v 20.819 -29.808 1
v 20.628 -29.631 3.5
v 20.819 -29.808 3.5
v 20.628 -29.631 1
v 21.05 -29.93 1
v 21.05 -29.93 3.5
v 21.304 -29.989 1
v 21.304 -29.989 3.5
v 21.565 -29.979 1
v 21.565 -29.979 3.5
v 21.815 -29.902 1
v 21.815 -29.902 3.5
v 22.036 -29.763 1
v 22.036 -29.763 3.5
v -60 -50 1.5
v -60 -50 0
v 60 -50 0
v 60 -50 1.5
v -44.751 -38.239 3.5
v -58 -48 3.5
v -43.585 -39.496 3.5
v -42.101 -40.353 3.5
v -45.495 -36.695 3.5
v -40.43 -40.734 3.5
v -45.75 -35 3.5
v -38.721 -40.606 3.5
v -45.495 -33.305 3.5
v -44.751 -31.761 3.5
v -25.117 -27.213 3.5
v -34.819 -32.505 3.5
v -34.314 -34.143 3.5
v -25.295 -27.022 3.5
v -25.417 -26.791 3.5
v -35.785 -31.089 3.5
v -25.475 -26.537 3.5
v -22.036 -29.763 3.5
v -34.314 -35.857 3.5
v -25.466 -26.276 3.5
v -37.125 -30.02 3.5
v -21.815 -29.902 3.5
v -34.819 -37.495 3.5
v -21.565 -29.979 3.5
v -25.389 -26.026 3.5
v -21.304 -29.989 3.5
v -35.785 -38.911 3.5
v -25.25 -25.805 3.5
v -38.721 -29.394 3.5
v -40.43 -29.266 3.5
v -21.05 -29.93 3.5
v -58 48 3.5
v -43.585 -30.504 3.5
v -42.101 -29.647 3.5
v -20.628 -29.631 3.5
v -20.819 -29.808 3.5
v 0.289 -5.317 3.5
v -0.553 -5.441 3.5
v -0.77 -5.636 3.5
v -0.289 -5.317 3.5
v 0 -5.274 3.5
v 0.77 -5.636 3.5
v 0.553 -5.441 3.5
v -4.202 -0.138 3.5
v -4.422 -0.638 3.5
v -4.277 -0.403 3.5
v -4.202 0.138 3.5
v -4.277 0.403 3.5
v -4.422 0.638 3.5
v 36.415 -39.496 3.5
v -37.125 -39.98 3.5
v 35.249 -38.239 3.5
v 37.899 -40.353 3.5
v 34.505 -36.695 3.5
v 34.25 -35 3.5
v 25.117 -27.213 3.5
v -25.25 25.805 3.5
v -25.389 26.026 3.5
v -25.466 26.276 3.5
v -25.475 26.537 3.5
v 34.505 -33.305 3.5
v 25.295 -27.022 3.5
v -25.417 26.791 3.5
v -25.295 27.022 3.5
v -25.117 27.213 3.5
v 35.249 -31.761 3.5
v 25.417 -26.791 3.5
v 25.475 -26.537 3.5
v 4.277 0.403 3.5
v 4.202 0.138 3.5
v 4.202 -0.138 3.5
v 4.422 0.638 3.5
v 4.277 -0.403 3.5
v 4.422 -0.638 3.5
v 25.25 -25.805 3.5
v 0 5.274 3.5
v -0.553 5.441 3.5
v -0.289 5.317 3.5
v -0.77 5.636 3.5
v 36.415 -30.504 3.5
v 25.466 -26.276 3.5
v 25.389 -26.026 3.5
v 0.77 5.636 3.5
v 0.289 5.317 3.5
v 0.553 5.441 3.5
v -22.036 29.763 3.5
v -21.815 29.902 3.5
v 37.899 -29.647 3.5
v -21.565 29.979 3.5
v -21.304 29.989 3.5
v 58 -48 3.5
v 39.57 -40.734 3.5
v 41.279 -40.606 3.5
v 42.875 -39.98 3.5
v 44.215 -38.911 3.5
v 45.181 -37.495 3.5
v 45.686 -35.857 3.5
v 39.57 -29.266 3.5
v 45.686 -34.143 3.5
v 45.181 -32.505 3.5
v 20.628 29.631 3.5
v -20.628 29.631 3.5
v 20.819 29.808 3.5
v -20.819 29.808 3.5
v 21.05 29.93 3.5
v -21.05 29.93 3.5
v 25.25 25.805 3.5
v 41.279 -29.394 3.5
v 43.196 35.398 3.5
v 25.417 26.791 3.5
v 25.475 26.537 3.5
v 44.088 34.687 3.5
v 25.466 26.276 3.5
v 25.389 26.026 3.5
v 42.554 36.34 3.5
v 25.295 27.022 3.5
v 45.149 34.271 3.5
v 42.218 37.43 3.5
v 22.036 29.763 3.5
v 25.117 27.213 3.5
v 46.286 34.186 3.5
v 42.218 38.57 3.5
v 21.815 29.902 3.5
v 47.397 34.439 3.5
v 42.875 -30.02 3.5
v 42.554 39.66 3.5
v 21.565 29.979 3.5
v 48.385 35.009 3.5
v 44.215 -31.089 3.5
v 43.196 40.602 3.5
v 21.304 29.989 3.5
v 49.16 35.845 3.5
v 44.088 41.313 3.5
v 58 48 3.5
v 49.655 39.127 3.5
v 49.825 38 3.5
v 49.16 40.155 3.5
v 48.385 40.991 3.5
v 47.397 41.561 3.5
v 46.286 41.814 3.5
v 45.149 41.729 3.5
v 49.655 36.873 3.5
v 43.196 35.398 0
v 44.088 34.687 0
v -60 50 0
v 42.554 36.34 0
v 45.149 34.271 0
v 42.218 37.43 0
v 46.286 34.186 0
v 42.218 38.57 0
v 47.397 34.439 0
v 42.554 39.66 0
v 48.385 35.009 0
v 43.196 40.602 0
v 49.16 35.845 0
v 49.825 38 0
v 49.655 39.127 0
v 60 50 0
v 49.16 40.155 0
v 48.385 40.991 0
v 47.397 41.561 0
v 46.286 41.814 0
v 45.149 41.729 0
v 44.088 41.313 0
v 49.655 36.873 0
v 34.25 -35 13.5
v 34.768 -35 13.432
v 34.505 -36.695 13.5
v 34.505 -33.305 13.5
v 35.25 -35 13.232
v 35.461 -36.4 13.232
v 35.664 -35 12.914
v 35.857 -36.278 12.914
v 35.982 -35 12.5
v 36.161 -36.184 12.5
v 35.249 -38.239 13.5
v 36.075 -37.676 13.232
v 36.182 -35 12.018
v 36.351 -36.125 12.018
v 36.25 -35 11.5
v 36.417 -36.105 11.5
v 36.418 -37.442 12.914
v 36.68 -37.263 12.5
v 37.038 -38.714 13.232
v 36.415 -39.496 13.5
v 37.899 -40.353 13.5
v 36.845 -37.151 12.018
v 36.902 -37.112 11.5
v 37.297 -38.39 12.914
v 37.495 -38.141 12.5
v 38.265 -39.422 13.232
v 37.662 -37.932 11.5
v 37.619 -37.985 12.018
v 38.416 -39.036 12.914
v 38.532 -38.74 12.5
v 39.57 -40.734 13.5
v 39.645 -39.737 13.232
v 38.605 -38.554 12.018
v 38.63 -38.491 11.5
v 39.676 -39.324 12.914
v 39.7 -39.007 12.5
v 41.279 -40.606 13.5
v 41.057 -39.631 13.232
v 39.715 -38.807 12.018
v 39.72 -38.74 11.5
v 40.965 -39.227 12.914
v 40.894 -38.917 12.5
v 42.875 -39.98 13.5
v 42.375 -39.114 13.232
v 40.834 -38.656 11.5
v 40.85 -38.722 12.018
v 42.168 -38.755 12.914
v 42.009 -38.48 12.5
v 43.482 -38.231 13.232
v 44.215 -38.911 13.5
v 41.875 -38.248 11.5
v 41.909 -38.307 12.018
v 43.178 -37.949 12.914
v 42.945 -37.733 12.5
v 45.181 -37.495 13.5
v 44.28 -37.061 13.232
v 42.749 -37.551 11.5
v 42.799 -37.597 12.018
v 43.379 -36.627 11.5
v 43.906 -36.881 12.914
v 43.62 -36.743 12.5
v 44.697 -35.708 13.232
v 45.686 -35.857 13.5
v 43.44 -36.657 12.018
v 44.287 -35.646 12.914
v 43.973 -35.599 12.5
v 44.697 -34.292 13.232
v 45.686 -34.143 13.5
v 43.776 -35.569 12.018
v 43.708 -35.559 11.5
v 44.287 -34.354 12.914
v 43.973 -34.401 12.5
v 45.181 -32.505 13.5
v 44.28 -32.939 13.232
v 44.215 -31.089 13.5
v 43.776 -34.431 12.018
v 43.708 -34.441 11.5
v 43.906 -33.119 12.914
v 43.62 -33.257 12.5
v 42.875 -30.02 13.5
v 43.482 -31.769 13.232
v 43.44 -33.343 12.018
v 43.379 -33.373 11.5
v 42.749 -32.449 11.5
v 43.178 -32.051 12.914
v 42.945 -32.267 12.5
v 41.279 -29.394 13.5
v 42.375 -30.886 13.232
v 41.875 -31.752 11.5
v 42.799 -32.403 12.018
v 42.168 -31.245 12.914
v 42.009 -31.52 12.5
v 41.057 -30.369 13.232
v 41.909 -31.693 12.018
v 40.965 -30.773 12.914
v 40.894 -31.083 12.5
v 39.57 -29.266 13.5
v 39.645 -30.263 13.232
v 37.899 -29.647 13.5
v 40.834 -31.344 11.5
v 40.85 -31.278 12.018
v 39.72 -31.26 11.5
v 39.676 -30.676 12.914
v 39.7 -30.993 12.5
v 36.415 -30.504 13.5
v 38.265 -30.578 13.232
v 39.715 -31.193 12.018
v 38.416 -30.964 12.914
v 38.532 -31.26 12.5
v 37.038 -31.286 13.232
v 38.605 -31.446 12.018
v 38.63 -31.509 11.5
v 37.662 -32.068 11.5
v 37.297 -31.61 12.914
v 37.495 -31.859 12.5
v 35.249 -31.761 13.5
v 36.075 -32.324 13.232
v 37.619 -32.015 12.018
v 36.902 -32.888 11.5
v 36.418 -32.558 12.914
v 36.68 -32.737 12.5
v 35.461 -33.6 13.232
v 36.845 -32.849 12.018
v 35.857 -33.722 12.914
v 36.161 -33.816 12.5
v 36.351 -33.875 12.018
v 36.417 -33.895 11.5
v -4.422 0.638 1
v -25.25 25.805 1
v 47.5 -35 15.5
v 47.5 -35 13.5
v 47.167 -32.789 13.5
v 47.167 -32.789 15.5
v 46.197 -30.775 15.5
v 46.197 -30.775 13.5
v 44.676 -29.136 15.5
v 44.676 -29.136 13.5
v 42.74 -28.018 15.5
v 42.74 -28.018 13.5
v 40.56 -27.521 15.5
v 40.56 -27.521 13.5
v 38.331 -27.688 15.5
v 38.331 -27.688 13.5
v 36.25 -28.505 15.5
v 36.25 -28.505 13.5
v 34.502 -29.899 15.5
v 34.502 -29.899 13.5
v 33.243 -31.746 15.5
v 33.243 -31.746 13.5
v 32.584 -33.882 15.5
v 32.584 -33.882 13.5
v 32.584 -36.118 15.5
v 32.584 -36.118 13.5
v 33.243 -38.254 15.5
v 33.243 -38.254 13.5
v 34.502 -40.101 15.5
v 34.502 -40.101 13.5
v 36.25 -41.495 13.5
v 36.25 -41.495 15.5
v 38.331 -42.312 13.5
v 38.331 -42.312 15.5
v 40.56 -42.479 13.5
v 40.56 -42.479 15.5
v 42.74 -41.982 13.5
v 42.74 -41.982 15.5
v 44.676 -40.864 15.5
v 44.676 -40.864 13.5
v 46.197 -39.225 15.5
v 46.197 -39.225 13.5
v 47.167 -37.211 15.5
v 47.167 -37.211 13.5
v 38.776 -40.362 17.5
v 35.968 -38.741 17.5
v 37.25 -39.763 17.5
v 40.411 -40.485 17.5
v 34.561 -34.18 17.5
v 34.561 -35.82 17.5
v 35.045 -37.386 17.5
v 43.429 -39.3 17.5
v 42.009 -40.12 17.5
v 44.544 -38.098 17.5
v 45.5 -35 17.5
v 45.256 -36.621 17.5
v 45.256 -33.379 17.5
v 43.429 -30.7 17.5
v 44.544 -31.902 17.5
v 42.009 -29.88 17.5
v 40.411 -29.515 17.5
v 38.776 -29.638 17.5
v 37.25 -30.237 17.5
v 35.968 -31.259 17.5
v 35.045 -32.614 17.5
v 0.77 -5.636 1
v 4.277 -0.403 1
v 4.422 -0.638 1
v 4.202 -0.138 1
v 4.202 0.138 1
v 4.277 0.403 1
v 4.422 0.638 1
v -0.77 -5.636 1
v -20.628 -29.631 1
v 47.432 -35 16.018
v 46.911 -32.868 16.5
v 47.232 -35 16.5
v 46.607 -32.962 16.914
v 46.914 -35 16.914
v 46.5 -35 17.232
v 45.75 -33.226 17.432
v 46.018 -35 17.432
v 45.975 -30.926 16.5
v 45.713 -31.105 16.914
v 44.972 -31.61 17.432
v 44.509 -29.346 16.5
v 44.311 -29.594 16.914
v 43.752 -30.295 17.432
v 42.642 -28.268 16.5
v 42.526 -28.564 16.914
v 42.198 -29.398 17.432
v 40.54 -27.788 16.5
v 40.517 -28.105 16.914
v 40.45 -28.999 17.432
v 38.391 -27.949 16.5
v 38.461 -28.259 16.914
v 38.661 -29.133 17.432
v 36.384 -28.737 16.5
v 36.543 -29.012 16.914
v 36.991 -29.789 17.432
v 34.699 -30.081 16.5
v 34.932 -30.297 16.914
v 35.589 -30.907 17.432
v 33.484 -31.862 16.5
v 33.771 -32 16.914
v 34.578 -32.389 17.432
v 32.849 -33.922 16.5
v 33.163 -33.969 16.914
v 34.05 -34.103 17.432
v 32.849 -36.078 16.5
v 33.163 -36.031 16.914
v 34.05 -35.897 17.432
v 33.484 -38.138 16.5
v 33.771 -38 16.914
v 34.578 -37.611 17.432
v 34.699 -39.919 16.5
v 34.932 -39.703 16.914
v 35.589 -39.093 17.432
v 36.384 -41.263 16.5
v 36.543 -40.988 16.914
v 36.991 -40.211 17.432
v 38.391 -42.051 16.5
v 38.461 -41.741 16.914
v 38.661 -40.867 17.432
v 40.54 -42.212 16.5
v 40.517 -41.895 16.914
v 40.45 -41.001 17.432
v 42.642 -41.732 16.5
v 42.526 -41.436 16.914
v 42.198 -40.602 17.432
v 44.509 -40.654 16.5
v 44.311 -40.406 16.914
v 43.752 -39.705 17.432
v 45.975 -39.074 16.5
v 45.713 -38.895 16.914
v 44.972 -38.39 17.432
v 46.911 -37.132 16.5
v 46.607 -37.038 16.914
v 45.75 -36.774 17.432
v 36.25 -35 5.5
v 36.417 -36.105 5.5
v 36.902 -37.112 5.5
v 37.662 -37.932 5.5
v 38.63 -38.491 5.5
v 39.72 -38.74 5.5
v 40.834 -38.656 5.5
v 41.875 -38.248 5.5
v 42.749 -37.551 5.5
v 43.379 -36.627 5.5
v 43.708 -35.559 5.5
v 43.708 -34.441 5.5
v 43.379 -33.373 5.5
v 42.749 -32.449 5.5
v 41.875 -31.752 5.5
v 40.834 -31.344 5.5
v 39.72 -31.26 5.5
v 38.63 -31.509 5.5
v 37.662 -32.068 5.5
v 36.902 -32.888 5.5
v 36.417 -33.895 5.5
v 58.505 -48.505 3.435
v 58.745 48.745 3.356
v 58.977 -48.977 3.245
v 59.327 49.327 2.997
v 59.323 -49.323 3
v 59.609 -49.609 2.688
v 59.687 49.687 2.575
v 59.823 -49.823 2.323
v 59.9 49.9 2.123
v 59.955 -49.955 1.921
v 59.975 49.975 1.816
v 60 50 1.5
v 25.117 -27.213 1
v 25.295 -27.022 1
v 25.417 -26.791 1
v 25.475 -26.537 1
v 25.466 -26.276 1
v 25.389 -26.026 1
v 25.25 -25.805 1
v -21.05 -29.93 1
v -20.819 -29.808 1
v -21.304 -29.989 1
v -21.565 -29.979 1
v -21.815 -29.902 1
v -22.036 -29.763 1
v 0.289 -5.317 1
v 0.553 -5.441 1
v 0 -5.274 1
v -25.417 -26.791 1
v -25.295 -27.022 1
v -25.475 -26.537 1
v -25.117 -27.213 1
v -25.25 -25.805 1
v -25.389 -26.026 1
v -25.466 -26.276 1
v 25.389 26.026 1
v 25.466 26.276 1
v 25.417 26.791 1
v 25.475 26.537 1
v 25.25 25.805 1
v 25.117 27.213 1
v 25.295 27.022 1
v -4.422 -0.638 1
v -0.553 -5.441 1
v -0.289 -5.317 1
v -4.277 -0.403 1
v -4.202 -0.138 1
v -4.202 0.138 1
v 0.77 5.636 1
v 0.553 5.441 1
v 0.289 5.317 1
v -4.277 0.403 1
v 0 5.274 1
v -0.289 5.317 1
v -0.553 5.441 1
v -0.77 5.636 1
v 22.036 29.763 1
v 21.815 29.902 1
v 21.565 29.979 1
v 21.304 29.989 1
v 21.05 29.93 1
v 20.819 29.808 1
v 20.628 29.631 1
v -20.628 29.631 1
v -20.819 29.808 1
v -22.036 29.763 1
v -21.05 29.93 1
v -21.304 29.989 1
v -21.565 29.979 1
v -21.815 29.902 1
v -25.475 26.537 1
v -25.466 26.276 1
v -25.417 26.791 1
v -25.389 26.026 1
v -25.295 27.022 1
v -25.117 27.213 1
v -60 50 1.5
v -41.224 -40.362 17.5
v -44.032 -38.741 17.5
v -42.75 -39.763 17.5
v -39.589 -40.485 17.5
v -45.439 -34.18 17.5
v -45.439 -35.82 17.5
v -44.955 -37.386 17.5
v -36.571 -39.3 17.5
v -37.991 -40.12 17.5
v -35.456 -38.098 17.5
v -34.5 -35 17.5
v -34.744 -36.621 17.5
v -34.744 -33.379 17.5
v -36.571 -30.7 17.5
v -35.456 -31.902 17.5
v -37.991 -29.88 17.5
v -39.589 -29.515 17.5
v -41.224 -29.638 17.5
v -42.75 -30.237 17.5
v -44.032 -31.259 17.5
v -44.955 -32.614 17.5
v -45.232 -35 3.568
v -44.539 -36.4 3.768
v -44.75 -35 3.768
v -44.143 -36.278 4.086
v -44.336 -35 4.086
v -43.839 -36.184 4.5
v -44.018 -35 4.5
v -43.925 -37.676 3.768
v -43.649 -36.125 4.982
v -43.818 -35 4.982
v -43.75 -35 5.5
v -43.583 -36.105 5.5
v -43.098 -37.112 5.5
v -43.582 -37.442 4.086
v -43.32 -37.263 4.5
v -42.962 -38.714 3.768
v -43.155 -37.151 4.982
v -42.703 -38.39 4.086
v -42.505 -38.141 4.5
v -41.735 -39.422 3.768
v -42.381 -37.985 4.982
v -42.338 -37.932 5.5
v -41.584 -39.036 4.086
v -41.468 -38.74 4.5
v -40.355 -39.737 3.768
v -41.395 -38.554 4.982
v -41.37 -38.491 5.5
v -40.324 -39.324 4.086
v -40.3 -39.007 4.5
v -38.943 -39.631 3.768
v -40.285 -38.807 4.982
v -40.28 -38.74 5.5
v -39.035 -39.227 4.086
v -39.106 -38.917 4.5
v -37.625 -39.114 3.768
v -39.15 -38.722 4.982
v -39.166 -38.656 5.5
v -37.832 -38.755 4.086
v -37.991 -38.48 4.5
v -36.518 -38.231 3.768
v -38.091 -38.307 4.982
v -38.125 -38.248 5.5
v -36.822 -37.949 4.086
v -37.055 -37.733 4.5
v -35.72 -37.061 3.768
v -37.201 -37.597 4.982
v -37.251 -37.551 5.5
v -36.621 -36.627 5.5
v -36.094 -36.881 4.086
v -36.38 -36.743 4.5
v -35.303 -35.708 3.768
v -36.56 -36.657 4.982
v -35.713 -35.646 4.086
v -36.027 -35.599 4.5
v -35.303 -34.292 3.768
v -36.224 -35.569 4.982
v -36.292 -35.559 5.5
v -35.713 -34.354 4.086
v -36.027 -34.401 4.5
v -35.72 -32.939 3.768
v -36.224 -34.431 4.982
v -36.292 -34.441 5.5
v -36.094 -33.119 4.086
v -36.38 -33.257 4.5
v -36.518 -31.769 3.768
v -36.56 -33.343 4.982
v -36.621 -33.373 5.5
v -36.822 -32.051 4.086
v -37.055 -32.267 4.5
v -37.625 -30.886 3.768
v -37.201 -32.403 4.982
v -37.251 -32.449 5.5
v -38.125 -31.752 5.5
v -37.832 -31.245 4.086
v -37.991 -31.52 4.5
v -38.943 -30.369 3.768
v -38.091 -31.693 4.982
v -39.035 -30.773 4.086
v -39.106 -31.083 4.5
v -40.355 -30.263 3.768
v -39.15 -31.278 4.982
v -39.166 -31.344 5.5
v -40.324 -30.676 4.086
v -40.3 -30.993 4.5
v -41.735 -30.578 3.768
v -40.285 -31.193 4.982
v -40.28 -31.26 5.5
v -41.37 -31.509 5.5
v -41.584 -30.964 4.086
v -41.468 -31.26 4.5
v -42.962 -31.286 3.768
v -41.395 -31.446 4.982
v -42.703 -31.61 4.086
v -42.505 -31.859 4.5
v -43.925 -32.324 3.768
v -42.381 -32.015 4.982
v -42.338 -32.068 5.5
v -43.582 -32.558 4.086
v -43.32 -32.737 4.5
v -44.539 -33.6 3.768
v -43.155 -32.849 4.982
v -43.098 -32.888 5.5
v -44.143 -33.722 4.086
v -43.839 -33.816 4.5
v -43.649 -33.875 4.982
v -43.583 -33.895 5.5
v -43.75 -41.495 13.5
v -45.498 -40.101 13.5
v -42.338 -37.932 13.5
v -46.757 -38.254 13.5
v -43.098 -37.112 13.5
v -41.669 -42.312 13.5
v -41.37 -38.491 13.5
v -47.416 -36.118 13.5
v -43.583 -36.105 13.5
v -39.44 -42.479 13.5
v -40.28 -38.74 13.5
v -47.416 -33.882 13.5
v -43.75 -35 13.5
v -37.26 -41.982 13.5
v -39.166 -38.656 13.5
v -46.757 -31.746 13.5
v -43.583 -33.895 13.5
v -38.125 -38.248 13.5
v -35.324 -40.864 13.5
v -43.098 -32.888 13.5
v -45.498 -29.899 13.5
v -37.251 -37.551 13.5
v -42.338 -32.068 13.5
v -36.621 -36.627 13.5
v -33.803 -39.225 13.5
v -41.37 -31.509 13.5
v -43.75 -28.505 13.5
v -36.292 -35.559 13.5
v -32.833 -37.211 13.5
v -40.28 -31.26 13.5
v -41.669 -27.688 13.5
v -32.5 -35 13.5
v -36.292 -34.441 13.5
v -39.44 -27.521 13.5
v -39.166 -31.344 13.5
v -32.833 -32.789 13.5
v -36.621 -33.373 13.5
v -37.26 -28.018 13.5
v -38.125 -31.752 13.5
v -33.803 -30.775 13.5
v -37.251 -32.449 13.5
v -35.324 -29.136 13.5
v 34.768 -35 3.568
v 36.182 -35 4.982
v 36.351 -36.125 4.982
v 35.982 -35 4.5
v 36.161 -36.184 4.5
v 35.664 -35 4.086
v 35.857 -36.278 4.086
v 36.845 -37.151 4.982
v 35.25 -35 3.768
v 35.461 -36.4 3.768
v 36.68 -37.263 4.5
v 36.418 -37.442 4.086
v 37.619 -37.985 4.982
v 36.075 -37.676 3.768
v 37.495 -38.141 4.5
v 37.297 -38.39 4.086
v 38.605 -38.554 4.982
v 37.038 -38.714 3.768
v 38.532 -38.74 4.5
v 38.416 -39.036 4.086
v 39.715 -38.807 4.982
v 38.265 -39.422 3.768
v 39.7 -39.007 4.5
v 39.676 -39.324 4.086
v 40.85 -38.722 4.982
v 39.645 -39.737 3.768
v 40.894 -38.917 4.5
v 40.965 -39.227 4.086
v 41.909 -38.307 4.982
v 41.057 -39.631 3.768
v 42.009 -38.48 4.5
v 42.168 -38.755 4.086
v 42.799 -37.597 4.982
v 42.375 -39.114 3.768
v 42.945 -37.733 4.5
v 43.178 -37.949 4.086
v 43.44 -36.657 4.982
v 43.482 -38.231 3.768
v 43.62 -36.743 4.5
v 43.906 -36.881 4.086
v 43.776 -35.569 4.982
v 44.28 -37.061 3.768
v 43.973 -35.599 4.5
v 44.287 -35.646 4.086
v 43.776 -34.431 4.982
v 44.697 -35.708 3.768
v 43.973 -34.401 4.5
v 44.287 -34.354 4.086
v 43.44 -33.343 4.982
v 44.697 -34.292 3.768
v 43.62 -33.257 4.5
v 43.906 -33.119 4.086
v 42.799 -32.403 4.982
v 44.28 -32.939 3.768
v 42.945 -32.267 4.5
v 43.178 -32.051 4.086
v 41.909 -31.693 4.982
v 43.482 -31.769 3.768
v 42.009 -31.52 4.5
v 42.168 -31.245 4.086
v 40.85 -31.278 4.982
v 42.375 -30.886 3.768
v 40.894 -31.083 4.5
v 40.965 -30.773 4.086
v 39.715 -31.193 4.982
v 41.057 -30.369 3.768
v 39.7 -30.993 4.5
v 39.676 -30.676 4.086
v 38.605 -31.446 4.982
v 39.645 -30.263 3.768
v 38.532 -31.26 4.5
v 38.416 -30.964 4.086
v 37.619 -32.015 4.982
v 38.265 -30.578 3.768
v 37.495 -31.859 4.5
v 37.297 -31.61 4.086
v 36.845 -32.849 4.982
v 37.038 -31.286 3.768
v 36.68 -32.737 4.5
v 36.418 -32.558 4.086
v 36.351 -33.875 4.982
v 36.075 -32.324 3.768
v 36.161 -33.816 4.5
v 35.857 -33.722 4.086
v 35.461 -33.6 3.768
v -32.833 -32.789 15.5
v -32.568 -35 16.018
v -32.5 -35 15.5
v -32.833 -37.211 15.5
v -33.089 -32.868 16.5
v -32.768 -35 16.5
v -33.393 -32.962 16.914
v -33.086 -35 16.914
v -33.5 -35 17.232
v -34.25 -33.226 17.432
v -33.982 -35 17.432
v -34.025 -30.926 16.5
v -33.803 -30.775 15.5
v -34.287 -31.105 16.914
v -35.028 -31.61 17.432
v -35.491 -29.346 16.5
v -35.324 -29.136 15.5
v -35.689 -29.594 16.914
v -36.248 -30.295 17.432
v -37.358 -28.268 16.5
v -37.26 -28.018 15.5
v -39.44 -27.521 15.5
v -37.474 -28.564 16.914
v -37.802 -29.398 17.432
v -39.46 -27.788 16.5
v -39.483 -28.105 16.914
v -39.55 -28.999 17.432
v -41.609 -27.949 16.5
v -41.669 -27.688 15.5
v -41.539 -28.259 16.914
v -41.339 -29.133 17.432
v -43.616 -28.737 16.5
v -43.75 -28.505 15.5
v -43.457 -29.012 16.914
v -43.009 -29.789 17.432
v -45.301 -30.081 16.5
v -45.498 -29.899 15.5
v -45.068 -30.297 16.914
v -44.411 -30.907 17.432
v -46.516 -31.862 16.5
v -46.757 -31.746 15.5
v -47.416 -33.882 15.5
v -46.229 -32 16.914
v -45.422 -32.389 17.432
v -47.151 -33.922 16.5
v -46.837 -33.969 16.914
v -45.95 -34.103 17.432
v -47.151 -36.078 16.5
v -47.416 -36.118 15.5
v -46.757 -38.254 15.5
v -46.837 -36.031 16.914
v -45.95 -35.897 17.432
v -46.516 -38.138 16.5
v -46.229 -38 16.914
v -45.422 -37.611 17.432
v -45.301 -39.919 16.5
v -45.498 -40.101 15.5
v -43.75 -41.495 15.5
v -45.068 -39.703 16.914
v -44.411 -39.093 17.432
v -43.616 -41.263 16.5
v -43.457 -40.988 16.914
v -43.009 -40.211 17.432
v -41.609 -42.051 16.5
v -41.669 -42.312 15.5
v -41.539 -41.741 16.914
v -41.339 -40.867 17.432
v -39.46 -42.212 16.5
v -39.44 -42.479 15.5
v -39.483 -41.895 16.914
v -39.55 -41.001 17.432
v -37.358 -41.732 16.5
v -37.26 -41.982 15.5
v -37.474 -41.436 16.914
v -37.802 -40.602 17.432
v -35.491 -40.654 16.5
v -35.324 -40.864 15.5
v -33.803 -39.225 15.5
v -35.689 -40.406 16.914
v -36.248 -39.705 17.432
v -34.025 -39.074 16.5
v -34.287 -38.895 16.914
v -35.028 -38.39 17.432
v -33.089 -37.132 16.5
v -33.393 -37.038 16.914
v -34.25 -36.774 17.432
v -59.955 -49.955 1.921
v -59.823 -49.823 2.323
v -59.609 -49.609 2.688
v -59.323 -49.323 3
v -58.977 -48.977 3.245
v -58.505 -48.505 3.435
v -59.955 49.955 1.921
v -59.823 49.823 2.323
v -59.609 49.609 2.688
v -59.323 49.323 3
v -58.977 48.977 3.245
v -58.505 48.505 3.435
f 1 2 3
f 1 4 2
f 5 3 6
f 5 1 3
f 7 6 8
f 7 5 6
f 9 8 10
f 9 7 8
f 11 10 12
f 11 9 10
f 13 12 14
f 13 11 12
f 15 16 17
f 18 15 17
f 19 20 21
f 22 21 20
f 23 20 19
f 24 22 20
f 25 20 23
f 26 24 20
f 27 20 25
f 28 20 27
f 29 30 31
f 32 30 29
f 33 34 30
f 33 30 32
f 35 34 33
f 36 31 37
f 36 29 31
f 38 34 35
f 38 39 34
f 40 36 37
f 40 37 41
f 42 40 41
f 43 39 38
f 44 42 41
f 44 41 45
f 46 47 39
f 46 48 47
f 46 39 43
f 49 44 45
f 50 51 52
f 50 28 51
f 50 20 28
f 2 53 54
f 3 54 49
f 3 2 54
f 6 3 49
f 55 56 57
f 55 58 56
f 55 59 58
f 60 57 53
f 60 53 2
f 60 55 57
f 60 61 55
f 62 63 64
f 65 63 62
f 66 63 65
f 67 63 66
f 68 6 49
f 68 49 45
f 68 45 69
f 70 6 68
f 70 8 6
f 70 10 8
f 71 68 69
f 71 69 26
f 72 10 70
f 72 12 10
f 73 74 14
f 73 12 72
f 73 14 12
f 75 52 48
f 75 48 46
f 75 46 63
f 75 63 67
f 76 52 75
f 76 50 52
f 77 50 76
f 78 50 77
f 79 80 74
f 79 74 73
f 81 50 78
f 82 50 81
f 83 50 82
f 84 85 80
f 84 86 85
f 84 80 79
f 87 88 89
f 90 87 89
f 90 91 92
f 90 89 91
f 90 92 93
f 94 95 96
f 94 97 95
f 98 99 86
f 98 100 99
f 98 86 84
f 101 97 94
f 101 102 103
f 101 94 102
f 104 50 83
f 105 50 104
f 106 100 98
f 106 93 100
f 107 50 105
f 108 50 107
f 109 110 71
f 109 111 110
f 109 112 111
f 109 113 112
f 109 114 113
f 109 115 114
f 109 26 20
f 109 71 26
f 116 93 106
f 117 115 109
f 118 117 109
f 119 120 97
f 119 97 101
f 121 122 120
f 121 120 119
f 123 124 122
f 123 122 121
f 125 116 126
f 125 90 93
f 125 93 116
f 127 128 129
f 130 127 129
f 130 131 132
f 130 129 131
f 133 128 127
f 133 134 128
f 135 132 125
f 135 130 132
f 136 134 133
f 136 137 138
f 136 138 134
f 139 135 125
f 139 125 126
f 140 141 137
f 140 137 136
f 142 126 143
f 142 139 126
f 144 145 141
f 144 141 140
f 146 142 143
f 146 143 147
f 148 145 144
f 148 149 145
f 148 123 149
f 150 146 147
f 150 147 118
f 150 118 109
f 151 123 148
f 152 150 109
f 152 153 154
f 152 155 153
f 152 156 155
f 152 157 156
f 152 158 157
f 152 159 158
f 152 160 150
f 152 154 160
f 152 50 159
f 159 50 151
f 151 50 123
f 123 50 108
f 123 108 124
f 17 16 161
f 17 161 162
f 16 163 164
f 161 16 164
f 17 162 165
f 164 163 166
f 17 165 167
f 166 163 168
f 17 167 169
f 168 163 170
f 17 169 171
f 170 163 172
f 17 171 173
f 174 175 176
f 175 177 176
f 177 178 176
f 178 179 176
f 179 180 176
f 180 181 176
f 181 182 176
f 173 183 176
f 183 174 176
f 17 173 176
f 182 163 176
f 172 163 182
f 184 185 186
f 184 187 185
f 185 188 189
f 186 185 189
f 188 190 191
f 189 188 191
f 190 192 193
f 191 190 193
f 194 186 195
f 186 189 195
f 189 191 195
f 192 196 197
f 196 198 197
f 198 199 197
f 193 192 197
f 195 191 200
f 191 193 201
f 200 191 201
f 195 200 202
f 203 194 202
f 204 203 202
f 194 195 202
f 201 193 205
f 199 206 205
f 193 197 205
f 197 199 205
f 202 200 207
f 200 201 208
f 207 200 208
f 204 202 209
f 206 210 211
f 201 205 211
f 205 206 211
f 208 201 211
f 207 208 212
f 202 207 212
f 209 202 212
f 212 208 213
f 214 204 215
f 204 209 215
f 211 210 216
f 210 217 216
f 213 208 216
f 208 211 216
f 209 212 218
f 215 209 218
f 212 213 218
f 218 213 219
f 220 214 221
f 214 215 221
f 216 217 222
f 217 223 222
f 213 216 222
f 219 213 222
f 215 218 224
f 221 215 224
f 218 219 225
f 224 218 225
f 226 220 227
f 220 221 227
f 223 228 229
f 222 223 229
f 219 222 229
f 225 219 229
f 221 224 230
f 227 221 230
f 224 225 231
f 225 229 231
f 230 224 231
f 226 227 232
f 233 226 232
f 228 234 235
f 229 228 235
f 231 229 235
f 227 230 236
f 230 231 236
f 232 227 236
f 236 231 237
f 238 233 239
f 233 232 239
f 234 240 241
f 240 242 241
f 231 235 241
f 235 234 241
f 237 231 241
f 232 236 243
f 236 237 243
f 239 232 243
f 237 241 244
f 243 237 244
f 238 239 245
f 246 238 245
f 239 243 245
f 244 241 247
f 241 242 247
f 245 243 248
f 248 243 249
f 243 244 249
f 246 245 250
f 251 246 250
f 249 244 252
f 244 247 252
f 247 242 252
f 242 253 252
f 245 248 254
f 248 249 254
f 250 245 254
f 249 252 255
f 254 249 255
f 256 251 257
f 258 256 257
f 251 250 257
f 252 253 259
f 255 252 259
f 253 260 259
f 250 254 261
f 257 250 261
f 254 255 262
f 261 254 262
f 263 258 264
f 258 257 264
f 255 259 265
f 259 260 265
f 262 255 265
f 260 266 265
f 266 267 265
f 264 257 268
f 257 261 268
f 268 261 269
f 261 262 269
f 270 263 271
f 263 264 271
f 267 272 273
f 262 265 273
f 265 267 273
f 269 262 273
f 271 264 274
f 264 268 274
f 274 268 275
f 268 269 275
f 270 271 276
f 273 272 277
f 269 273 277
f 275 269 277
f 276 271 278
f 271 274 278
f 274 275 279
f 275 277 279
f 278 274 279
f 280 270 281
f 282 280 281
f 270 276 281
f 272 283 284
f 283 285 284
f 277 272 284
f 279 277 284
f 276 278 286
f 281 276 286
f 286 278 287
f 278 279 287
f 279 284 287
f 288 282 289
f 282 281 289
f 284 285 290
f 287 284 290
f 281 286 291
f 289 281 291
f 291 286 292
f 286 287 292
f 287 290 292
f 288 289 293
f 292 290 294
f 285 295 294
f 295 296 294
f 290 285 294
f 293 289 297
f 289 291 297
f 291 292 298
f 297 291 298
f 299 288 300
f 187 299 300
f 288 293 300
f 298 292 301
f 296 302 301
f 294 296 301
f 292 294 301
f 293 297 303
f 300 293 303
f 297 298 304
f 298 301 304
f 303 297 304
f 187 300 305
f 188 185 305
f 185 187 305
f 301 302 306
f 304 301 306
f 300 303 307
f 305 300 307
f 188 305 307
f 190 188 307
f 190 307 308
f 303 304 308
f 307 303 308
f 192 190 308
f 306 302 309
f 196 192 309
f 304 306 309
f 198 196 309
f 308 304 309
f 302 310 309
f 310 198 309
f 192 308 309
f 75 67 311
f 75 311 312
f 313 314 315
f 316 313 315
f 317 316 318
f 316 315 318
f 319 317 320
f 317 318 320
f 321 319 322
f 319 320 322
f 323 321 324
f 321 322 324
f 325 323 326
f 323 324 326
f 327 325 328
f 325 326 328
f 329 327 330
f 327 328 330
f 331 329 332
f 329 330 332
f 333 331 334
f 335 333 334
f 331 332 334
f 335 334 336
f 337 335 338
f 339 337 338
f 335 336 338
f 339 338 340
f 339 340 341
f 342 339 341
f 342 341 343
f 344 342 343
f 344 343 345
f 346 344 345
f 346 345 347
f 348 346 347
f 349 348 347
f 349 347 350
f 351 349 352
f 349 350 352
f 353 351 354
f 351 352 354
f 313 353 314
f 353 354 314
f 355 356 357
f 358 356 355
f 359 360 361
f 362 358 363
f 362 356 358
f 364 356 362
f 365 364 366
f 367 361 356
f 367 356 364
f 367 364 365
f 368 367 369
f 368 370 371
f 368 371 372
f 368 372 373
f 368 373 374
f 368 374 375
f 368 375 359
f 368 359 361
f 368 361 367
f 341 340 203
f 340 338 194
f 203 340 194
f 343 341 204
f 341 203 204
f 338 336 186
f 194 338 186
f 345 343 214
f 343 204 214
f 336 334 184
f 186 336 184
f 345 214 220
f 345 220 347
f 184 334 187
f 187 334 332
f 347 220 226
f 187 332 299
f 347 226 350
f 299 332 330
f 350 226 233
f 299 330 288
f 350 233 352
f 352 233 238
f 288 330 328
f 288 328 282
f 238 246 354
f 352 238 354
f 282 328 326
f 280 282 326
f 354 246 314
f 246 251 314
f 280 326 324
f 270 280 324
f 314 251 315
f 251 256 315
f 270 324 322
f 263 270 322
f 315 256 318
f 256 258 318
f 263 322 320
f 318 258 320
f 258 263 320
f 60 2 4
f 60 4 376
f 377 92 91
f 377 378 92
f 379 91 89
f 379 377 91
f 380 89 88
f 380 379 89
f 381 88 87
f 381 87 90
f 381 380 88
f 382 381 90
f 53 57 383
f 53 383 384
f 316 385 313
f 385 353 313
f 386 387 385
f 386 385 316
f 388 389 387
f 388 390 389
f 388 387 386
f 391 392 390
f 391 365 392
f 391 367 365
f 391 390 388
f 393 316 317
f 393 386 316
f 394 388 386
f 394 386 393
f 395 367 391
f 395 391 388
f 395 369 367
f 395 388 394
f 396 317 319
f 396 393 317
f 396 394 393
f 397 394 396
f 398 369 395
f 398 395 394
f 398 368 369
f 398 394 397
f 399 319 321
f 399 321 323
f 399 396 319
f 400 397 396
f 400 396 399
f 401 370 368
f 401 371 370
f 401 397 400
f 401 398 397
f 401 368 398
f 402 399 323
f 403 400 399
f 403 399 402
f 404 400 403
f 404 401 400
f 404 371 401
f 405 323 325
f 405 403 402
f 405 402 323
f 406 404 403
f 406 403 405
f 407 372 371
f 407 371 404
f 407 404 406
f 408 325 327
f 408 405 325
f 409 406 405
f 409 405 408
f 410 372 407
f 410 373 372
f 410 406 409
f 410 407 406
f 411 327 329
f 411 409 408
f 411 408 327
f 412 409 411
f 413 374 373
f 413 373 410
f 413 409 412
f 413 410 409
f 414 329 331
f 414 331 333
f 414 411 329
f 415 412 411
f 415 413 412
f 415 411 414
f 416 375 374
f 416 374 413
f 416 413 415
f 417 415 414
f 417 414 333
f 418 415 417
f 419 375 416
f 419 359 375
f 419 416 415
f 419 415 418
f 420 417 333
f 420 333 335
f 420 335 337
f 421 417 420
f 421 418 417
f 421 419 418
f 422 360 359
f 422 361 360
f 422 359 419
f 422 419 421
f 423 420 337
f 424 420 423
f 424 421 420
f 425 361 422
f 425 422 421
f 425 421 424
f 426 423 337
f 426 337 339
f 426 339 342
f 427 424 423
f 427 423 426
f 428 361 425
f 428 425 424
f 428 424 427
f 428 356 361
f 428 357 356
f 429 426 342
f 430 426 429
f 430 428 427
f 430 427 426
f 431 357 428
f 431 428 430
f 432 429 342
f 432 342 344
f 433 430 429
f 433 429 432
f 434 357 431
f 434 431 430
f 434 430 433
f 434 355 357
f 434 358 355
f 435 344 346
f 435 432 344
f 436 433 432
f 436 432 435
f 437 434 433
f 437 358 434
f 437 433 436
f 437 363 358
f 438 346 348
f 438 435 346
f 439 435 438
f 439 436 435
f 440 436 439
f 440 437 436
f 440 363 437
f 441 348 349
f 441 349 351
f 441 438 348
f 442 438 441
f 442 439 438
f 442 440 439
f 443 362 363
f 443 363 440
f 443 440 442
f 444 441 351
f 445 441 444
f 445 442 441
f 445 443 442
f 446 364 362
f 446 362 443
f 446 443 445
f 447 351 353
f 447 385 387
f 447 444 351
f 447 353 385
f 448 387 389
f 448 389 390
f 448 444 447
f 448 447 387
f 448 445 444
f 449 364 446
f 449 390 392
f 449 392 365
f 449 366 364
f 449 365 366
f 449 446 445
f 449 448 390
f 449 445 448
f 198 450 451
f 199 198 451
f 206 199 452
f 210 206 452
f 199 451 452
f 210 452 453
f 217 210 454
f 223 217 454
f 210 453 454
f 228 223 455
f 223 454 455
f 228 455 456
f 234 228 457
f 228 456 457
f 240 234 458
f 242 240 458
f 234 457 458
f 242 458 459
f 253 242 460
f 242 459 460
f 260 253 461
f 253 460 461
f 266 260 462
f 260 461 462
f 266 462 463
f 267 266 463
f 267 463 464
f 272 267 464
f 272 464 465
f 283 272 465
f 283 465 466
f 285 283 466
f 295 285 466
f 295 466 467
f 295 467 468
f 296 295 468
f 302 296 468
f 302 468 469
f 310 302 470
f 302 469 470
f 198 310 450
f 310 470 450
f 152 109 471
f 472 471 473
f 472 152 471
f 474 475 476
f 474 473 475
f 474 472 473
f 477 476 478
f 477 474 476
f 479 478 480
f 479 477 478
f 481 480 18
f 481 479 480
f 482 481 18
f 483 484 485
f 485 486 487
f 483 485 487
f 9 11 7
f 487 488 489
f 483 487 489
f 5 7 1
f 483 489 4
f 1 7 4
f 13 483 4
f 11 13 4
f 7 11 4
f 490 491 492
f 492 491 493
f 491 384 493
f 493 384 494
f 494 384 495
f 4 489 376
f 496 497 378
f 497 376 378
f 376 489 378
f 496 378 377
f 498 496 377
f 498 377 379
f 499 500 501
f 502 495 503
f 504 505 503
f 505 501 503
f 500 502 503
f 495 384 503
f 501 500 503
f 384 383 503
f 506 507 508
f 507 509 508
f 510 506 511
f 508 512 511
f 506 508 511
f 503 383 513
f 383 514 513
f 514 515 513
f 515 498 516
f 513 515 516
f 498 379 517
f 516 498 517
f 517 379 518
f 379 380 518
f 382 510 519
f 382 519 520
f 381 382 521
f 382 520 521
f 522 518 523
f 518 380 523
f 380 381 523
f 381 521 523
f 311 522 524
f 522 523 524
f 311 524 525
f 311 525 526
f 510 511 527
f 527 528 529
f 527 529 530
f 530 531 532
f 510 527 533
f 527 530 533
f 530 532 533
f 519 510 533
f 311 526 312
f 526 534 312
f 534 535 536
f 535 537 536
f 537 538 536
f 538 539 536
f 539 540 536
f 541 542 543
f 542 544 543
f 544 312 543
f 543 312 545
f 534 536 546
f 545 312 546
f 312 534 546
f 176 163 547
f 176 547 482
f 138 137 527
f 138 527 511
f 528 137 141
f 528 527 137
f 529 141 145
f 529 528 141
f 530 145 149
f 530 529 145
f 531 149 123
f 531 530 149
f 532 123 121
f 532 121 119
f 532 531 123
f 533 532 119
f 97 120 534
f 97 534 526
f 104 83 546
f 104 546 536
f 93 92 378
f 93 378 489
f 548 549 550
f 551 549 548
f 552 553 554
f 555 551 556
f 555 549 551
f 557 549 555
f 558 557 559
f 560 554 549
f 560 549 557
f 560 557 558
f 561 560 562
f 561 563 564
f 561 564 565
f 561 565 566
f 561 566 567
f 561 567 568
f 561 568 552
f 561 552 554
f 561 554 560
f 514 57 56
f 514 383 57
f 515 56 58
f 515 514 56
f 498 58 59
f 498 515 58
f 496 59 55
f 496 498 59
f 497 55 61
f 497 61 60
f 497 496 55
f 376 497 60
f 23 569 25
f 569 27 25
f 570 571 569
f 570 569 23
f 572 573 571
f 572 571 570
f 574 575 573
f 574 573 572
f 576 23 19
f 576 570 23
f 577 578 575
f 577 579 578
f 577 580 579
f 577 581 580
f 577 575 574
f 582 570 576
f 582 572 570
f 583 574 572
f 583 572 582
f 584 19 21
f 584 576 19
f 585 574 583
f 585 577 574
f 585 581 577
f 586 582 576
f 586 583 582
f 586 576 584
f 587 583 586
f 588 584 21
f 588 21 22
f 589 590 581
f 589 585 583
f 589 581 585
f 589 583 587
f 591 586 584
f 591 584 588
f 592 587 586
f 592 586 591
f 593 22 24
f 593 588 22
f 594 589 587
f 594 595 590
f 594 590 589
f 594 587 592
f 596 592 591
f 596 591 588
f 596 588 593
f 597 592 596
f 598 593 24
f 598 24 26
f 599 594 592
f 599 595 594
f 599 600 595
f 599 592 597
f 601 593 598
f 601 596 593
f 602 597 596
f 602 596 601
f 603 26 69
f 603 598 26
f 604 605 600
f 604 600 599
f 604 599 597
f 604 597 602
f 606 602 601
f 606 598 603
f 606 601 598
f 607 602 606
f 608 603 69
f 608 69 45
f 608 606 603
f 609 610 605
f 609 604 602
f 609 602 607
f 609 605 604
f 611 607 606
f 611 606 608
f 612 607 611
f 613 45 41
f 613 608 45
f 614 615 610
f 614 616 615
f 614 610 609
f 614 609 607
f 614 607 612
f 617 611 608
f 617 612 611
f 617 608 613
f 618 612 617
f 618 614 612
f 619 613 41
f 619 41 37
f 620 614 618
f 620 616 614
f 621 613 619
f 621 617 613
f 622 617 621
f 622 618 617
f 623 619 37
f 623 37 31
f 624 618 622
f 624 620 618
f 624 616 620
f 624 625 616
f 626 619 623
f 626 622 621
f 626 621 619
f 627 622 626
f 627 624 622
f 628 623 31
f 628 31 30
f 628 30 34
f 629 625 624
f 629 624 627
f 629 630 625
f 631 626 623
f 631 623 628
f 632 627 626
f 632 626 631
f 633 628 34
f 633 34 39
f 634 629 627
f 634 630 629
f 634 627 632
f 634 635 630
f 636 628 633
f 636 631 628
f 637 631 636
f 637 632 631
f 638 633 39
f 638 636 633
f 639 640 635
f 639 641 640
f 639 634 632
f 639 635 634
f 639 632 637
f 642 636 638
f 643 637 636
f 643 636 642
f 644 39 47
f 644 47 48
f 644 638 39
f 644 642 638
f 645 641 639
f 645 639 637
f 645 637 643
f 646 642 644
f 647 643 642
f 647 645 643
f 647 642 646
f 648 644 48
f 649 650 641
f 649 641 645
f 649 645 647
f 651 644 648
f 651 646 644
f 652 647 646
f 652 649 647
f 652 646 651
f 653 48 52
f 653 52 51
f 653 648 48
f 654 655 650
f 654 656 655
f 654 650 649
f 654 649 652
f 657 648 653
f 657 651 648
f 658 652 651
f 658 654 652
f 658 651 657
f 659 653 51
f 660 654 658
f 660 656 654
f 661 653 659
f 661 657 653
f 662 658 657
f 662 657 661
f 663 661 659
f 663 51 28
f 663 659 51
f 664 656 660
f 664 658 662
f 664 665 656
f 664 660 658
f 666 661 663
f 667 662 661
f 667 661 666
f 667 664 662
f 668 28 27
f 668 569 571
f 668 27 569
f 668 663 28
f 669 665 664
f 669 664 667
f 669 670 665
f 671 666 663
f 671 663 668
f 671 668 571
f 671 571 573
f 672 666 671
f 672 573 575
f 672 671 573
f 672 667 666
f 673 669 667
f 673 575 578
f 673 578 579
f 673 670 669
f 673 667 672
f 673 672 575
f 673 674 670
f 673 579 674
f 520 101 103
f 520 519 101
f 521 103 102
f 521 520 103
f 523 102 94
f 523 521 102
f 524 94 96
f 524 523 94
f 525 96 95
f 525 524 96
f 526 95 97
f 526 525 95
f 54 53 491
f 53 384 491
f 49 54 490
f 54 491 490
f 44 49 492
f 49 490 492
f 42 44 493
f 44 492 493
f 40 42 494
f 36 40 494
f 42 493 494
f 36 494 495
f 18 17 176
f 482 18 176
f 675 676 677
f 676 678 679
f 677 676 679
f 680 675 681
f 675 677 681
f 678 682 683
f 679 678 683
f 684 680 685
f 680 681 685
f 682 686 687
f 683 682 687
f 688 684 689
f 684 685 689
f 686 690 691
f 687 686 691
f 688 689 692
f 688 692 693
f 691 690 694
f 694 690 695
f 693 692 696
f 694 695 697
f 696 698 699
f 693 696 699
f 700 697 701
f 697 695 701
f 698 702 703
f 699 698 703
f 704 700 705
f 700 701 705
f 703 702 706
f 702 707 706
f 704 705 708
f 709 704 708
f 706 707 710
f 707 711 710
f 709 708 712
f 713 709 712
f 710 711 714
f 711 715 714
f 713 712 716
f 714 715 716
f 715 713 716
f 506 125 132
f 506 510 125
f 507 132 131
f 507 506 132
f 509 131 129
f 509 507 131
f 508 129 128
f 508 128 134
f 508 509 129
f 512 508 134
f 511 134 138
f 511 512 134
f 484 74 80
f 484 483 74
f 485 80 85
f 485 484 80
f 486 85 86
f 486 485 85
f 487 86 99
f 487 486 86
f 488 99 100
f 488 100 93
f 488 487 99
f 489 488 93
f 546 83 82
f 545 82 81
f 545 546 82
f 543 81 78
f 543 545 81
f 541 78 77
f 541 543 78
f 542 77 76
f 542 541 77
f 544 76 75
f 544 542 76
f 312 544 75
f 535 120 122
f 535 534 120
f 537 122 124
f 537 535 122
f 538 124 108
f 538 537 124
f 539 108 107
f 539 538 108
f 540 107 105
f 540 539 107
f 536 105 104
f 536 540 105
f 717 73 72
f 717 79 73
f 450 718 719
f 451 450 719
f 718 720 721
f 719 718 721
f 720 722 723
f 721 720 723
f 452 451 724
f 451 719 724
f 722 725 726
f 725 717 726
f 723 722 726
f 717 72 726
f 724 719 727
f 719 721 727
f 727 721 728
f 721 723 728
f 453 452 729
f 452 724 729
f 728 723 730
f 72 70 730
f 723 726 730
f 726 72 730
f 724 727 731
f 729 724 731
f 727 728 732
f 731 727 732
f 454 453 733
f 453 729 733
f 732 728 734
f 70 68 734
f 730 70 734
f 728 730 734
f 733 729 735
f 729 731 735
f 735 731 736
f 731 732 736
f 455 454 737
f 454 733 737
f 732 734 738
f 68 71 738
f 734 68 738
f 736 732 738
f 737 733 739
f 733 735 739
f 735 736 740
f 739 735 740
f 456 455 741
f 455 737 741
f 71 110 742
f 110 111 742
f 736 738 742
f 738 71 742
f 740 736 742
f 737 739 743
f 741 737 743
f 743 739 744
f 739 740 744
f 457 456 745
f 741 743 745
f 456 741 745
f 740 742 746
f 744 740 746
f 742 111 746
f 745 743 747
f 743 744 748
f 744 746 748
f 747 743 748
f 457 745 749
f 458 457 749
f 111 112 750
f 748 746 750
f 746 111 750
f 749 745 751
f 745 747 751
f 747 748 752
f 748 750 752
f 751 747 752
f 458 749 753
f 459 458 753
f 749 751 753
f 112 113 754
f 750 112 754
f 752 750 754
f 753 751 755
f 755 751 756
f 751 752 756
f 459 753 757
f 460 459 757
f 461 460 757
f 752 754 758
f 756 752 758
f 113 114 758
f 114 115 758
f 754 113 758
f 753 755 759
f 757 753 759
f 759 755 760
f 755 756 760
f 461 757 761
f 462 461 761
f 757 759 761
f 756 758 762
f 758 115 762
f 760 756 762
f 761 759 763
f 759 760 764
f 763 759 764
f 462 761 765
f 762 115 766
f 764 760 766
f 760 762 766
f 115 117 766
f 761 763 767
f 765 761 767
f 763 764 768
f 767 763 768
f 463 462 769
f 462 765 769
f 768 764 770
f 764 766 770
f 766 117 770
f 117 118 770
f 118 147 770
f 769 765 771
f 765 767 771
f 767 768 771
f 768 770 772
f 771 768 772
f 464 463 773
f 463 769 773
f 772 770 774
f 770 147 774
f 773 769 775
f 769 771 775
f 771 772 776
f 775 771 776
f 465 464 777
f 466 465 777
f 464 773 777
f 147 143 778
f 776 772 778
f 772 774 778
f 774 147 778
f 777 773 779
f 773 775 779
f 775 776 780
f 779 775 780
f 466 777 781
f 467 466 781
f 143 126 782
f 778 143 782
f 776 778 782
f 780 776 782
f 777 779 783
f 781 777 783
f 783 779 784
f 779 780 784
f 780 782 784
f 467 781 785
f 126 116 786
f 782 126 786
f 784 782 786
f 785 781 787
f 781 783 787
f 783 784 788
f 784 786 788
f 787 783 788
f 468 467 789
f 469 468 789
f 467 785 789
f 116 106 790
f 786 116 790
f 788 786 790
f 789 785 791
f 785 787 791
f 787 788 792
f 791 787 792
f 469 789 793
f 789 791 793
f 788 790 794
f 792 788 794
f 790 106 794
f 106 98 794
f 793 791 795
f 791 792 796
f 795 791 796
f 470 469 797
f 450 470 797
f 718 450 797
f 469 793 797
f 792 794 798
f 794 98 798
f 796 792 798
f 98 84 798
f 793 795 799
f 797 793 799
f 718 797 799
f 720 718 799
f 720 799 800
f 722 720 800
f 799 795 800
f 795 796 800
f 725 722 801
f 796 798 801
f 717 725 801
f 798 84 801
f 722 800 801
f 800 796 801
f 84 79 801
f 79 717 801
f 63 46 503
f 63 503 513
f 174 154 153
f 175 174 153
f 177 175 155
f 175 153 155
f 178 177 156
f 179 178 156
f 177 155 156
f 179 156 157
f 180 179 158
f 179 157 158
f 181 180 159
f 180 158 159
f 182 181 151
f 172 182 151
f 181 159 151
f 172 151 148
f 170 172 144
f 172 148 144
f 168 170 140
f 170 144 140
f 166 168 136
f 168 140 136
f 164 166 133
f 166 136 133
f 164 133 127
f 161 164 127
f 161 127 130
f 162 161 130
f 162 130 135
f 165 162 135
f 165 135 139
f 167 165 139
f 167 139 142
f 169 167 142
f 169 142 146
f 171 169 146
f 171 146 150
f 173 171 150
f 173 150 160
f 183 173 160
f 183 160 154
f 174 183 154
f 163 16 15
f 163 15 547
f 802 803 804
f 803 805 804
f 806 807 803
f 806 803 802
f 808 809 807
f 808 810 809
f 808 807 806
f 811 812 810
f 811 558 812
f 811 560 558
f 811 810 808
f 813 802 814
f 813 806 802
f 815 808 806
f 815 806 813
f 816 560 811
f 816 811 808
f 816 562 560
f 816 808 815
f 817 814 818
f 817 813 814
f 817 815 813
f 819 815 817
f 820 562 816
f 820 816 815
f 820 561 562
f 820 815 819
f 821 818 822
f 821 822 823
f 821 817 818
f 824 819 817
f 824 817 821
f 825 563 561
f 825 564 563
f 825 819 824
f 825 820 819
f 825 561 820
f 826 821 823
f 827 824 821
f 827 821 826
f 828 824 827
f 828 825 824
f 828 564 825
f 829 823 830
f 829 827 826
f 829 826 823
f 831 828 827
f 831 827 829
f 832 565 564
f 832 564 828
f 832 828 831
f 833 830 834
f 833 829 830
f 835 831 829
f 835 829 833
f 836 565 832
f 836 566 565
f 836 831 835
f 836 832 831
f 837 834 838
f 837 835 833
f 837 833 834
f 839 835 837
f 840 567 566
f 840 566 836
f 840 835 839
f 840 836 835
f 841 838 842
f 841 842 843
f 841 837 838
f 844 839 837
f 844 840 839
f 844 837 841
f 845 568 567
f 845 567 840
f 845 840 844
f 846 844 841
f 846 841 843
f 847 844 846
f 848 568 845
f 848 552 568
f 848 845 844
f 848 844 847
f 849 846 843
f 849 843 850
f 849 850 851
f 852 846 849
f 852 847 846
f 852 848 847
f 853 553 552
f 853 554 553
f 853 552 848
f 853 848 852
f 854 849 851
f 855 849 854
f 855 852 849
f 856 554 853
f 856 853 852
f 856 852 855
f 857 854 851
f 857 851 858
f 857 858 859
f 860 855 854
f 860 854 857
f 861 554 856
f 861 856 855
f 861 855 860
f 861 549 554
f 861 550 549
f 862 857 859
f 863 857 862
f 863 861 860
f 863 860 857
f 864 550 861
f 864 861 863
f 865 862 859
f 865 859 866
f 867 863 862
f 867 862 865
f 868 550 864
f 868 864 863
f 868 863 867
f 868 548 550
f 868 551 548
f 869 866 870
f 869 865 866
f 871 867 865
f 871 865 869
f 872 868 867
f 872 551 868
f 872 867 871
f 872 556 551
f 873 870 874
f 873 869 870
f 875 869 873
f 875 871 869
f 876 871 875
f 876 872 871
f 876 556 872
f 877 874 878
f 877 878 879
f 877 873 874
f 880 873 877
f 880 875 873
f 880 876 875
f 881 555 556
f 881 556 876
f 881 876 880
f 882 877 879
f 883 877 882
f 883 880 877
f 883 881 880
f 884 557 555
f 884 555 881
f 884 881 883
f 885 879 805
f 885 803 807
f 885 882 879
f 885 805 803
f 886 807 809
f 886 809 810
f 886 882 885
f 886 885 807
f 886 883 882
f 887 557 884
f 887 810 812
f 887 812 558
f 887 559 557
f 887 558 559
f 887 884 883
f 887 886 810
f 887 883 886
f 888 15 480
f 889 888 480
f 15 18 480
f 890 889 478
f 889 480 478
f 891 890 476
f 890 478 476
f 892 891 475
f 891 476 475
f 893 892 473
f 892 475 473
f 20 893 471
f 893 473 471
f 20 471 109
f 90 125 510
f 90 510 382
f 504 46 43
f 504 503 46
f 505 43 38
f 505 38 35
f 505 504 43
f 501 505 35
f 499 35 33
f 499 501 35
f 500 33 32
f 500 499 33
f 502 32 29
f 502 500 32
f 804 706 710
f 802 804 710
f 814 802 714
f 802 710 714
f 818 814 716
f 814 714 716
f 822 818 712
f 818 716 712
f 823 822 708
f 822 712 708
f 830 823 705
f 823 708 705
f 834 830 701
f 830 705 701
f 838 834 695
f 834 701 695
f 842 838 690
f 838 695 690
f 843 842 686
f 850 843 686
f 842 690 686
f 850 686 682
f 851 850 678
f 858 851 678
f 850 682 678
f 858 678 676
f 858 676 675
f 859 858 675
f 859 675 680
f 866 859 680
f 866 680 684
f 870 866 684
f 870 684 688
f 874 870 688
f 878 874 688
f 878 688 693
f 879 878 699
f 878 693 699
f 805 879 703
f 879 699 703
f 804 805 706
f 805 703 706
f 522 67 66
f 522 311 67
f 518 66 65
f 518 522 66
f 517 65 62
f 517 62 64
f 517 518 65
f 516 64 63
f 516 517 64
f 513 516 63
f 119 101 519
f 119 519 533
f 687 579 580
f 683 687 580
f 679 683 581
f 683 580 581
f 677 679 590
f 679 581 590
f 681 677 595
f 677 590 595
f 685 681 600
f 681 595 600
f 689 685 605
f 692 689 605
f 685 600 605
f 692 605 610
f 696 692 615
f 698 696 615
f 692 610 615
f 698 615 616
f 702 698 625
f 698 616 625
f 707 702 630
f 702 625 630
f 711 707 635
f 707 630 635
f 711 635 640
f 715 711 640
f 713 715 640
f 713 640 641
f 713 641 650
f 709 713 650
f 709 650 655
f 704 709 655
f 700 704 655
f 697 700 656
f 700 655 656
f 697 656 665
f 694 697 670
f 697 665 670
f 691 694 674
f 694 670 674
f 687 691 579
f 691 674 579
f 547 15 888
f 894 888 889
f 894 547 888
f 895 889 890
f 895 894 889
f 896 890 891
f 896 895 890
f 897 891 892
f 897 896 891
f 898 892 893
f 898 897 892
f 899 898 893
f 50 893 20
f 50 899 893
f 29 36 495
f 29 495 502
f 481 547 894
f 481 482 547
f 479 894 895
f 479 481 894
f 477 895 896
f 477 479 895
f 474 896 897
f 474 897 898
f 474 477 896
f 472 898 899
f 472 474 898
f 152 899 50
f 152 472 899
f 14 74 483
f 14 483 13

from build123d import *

# Parameters (mm, degrees)
SKETCH1_W           = 120
SKETCH1_H           = 100
BOSS_EXTRUDE1_DEPTH = 3.5
SKETCH9_R           = 3.825
CUT_EXTRUDE4_DEPTH  = 4
FILLET1_R           = 2
SKETCH10_R          = 3.75
BOSS_EXTRUDE4_DEPTH = 10
SKETCH11_R          = 7.5
BOSS_EXTRUDE5_DEPTH = 4
SKETCH12_R          = 7.5
BOSS_EXTRUDE6_DEPTH = 4
FILLET2_R           = 2
CUT_EXTRUDE9_DEPTH  = 2.5
FILLET3_R           = 1


with BuildPart() as part:
    # Sketch1 → Boss-Extrude1 (new body)
    with BuildSketch(Plane.XY):
        Rectangle(SKETCH1_W, SKETCH1_H)
    extrude(amount=BOSS_EXTRUDE1_DEPTH)

    # Sketch9 → Cut-Extrude4 (cut)
    with BuildSketch(Plane.XY.offset(3.5)):
        with Locations((46, 38)):
            Circle(SKETCH9_R)
    extrude(amount=-CUT_EXTRUDE4_DEPTH, mode=Mode.SUBTRACT)

    # Fillet1
    fillet1_edges = [part.edges().sort_by_distance(p)[0] for p in [
        (-60, 0, 3.5),
        (0, -50, 3.5),
        (60, 0, 3.5),
        (0, 50, 3.5),
    ]]
    fillet(fillet1_edges, radius=FILLET1_R)

    # Sketch10 → Boss-Extrude4 (add)
    with BuildSketch(Plane.XY.offset(3.5)):
        with Locations(Location((-40, -35, 0), (0, 0, 180))):
            Circle(SKETCH10_R)
        with Locations(Location((40, -35, 0), (0, 0, 180))):
            Circle(SKETCH10_R)
    extrude(amount=BOSS_EXTRUDE4_DEPTH)

    # Sketch11 → Boss-Extrude5 (add)
    with BuildSketch(Plane.XY.offset(13.5)):
        with Locations((-40, -35)):
            Circle(SKETCH11_R)
    extrude(amount=BOSS_EXTRUDE5_DEPTH)

    # Sketch12 → Boss-Extrude6 (add)
    with BuildSketch(Plane.XY.offset(13.5)):
        with Locations((40, -35)):
            Circle(SKETCH12_R)
    extrude(amount=BOSS_EXTRUDE6_DEPTH)

    # Fillet2
    fillet2_edges = [part.edges().sort_by_distance(p)[0] for p in [
        (-36.25, -35, 3.5),
        (43.75, -35, 3.5),
        (43.75, -35, 13.5),
        (-47.5, -35, 17.5),
        (32.5, -35, 17.5),
    ]]
    fillet(fillet2_edges, radius=FILLET2_R)

    # Sketch19 → Cut-Extrude9 (cut)
    with BuildSketch(Plane.XY.offset(3.5)):
        Polygon((-21.265387255, -30.401058823), (-25.887753182, -26.575652539), (-3.894109616, 1.04e-07), (-25.887751659, 26.575653799), (-21.265385732, 30.401060083), (1.26e-07, 4.705382708), (21.265387255, 30.401058823), (25.887753182, 26.575652539), (3.894109616, -1.04e-07), (25.887751659, -26.575653799), (21.265385732, -30.401060083), (-1.26e-07, -4.705382708), align=None)
    extrude(amount=-CUT_EXTRUDE9_DEPTH, mode=Mode.SUBTRACT)

    # Fillet3
    fillet3_edges = [part.edges().sort_by_distance(p)[0] for p in [
        (-3.894109616, 1.04e-07, 2.25),
        (-25.887751659, 26.575653799, 2.25),
        (-21.265385732, 30.401060083, 2.25),
        (1.26e-07, 4.705382708, 2.25),
        (21.265387255, 30.401058823, 2.25),
        (25.887753182, 26.575652539, 2.25),
        (3.894109616, -1.04e-07, 2.25),
        (25.887751659, -26.575653799, 2.25),
        (21.265385732, -30.401060083, 2.25),
        (-1.26e-07, -4.705382708, 2.25),
        (-21.265387255, -30.401058823, 2.25),
        (-25.887753182, -26.575652539, 2.25),
    ]]
    fillet(fillet3_edges, radius=FILLET3_R)


solid = part.part
